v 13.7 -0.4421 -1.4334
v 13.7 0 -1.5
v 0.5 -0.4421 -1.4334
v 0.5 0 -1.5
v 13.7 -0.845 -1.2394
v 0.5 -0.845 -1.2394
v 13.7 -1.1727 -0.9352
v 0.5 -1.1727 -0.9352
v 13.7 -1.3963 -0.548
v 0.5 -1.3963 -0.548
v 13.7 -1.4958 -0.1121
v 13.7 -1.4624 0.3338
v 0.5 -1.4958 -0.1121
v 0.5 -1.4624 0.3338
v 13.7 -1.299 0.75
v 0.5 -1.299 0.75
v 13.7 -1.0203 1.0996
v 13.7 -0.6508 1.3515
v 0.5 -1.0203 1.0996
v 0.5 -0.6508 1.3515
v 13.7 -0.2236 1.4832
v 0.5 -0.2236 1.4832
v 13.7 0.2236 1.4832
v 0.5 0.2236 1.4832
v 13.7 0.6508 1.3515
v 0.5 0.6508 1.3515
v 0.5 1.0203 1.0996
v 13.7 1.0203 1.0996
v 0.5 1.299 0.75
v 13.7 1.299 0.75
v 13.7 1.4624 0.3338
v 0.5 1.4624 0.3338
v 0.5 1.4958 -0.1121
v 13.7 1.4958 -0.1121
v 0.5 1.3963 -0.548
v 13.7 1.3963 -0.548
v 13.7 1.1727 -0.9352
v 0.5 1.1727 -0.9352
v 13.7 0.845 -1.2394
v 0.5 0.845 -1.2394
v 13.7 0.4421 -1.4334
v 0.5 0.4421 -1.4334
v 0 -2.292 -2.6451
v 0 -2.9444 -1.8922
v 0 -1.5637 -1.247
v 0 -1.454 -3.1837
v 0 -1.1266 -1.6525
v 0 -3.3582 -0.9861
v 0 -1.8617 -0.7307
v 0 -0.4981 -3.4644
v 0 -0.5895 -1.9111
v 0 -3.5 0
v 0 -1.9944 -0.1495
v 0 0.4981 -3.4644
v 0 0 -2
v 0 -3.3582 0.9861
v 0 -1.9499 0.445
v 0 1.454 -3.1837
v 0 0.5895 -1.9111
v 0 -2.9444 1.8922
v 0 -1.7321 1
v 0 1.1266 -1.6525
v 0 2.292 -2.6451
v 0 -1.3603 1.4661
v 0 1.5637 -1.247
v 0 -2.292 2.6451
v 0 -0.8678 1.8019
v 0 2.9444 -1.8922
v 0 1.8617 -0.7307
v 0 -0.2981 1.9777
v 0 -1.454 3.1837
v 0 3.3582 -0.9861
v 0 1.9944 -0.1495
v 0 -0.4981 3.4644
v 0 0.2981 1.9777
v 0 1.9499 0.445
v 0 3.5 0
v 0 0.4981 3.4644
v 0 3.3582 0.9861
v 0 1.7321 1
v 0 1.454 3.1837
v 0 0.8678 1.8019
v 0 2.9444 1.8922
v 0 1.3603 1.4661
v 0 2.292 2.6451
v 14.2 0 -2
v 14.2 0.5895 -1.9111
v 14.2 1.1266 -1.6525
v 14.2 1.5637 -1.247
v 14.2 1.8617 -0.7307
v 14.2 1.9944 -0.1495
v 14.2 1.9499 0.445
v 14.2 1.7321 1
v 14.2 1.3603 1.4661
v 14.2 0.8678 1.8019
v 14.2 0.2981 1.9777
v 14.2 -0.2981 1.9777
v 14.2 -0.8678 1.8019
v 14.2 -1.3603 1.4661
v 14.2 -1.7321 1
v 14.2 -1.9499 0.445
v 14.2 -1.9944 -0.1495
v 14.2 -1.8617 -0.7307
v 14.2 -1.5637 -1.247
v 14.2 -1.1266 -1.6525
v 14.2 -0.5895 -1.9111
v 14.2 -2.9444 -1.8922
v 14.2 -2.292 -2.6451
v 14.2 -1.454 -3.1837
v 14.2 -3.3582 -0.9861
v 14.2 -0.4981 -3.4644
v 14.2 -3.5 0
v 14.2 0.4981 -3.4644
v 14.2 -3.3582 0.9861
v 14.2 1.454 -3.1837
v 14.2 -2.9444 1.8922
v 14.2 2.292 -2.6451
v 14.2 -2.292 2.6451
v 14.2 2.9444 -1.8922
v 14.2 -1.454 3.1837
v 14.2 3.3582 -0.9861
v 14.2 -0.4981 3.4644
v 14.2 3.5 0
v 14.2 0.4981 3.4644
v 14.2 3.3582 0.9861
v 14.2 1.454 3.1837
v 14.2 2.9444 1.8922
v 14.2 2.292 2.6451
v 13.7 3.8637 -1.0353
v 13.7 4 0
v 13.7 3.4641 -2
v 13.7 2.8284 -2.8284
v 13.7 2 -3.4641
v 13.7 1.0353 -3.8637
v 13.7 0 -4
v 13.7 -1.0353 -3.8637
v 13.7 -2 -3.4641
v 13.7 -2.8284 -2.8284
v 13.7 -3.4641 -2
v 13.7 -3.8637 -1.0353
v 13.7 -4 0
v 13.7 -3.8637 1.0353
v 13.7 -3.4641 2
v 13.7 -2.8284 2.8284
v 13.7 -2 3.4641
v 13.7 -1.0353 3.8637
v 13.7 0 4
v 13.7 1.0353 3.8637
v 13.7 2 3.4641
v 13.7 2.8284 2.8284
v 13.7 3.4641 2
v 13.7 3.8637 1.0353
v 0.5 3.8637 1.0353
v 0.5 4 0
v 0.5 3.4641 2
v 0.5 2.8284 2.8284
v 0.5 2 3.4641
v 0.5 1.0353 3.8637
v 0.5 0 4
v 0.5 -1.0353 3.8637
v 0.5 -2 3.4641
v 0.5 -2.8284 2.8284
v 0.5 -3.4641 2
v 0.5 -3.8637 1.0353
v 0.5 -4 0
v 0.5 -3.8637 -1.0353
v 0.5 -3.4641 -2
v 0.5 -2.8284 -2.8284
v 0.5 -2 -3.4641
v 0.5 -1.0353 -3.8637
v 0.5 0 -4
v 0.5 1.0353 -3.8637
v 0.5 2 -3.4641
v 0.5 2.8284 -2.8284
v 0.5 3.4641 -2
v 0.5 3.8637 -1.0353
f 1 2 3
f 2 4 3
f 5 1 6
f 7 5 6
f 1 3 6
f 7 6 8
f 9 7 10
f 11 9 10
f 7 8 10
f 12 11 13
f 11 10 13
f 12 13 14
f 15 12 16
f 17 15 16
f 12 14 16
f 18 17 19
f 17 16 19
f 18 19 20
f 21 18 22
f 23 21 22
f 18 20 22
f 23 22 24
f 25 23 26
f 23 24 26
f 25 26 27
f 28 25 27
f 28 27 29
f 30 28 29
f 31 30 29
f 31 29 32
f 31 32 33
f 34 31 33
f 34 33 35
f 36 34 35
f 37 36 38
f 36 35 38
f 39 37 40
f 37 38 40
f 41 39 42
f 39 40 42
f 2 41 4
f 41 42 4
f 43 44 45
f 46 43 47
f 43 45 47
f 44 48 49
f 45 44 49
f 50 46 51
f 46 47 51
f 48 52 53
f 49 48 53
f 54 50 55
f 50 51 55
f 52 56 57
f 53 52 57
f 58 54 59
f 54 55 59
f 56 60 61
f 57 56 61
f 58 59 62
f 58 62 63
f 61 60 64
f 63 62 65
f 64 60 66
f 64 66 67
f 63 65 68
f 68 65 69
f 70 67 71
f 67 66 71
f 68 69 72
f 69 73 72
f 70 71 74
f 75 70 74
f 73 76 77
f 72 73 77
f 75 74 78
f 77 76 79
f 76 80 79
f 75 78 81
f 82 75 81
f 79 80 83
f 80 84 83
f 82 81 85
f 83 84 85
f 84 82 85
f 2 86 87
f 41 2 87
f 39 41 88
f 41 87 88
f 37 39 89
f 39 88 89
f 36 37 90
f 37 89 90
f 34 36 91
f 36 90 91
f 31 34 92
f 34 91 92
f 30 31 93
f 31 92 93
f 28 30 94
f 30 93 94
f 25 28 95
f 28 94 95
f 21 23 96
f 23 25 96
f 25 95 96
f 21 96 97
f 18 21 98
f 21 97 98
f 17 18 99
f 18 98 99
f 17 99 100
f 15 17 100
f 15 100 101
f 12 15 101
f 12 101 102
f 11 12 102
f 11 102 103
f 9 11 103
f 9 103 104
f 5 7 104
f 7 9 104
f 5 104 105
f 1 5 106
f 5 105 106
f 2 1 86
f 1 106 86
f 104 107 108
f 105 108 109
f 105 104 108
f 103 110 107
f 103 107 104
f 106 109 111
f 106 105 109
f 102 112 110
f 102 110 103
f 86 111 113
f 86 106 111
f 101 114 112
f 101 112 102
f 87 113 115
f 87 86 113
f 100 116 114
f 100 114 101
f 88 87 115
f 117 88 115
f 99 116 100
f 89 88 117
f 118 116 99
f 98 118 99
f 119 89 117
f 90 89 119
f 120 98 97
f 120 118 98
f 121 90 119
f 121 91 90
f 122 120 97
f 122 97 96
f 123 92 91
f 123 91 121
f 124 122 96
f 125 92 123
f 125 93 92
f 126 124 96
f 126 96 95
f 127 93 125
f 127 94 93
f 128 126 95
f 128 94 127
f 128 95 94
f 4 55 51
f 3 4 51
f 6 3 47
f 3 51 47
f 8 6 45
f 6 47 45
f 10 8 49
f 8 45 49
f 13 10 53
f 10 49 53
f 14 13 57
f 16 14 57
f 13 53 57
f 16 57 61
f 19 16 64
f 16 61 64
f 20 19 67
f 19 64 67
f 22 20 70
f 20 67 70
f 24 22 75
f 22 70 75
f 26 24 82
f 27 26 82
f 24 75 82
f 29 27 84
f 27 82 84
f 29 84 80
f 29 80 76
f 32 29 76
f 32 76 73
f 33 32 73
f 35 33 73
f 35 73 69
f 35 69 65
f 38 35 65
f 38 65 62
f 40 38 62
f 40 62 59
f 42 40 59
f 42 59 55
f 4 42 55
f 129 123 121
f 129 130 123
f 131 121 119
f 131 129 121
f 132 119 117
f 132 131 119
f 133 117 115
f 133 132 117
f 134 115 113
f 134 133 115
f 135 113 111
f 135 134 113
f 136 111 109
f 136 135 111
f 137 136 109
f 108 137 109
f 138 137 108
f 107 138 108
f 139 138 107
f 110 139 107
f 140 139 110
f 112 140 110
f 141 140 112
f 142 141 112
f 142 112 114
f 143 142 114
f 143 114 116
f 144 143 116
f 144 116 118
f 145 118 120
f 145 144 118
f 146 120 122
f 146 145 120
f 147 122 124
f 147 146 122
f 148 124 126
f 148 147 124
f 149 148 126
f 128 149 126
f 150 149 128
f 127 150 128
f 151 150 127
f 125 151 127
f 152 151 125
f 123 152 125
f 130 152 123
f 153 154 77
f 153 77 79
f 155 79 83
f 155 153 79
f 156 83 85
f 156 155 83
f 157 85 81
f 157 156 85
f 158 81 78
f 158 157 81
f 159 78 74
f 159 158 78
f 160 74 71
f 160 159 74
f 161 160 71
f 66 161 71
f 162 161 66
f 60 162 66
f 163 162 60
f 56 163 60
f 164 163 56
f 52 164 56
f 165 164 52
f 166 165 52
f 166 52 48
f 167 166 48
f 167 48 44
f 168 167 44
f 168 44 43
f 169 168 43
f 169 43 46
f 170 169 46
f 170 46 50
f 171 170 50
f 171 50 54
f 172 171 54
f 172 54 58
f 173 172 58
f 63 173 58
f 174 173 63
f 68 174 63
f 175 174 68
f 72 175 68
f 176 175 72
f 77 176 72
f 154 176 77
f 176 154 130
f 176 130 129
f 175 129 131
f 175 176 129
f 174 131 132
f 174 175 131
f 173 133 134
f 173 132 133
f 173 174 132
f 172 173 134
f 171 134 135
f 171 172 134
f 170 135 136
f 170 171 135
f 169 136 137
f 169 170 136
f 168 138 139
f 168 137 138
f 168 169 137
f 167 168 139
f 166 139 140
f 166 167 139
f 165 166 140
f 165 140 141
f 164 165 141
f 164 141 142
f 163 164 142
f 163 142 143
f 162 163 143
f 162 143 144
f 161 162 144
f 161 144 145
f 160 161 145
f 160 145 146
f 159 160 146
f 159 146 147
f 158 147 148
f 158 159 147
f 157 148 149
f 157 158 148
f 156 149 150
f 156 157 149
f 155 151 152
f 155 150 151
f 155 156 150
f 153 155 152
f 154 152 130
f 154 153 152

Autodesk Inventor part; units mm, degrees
ref_plane "YZ Plane" through (0, 0, 0) normal (1, 0, 0) x (0, 1, 0)
ref_plane "XZ Plane" through (0, 0, 0) normal (0, 1, 0) x (-1, 0, 0)
ref_plane "XY Plane" through (0, 0, 0) normal (0, 0, 1) x (1, 0, 0)
sketch "Sketch1" plane through (0, 0, 0) normal (1, 0, 0) x (0, 1, 0)
  circle A0 centre (0, 0) radius 4
  dimension "d0" = 8
extrude "Extrusion1" add sketch "Sketch1" along normal blind 14.2
sketch "Sketch2" plane through (14.2, 0, 0) normal (1, 0, 0) x (0, 0, -1)
  circle A0 centre (0, 0) radius 4 projected
hole "Hole1" at (14.2, 0, 0) direction (-1, 0, 0) diameter 3 end through all clearance for "Socket Head Cap Screw" size "M3" standard "Ansi Metric M Profile"
chamfer "Chamfer1" distance 0.5 angle 45 4 edges at (0, -4, 0) (0, 0, 1.5) (14.2, 0, 1.5) (14.2, -4, 0)
properties part number "Rear Fan Spacer"
